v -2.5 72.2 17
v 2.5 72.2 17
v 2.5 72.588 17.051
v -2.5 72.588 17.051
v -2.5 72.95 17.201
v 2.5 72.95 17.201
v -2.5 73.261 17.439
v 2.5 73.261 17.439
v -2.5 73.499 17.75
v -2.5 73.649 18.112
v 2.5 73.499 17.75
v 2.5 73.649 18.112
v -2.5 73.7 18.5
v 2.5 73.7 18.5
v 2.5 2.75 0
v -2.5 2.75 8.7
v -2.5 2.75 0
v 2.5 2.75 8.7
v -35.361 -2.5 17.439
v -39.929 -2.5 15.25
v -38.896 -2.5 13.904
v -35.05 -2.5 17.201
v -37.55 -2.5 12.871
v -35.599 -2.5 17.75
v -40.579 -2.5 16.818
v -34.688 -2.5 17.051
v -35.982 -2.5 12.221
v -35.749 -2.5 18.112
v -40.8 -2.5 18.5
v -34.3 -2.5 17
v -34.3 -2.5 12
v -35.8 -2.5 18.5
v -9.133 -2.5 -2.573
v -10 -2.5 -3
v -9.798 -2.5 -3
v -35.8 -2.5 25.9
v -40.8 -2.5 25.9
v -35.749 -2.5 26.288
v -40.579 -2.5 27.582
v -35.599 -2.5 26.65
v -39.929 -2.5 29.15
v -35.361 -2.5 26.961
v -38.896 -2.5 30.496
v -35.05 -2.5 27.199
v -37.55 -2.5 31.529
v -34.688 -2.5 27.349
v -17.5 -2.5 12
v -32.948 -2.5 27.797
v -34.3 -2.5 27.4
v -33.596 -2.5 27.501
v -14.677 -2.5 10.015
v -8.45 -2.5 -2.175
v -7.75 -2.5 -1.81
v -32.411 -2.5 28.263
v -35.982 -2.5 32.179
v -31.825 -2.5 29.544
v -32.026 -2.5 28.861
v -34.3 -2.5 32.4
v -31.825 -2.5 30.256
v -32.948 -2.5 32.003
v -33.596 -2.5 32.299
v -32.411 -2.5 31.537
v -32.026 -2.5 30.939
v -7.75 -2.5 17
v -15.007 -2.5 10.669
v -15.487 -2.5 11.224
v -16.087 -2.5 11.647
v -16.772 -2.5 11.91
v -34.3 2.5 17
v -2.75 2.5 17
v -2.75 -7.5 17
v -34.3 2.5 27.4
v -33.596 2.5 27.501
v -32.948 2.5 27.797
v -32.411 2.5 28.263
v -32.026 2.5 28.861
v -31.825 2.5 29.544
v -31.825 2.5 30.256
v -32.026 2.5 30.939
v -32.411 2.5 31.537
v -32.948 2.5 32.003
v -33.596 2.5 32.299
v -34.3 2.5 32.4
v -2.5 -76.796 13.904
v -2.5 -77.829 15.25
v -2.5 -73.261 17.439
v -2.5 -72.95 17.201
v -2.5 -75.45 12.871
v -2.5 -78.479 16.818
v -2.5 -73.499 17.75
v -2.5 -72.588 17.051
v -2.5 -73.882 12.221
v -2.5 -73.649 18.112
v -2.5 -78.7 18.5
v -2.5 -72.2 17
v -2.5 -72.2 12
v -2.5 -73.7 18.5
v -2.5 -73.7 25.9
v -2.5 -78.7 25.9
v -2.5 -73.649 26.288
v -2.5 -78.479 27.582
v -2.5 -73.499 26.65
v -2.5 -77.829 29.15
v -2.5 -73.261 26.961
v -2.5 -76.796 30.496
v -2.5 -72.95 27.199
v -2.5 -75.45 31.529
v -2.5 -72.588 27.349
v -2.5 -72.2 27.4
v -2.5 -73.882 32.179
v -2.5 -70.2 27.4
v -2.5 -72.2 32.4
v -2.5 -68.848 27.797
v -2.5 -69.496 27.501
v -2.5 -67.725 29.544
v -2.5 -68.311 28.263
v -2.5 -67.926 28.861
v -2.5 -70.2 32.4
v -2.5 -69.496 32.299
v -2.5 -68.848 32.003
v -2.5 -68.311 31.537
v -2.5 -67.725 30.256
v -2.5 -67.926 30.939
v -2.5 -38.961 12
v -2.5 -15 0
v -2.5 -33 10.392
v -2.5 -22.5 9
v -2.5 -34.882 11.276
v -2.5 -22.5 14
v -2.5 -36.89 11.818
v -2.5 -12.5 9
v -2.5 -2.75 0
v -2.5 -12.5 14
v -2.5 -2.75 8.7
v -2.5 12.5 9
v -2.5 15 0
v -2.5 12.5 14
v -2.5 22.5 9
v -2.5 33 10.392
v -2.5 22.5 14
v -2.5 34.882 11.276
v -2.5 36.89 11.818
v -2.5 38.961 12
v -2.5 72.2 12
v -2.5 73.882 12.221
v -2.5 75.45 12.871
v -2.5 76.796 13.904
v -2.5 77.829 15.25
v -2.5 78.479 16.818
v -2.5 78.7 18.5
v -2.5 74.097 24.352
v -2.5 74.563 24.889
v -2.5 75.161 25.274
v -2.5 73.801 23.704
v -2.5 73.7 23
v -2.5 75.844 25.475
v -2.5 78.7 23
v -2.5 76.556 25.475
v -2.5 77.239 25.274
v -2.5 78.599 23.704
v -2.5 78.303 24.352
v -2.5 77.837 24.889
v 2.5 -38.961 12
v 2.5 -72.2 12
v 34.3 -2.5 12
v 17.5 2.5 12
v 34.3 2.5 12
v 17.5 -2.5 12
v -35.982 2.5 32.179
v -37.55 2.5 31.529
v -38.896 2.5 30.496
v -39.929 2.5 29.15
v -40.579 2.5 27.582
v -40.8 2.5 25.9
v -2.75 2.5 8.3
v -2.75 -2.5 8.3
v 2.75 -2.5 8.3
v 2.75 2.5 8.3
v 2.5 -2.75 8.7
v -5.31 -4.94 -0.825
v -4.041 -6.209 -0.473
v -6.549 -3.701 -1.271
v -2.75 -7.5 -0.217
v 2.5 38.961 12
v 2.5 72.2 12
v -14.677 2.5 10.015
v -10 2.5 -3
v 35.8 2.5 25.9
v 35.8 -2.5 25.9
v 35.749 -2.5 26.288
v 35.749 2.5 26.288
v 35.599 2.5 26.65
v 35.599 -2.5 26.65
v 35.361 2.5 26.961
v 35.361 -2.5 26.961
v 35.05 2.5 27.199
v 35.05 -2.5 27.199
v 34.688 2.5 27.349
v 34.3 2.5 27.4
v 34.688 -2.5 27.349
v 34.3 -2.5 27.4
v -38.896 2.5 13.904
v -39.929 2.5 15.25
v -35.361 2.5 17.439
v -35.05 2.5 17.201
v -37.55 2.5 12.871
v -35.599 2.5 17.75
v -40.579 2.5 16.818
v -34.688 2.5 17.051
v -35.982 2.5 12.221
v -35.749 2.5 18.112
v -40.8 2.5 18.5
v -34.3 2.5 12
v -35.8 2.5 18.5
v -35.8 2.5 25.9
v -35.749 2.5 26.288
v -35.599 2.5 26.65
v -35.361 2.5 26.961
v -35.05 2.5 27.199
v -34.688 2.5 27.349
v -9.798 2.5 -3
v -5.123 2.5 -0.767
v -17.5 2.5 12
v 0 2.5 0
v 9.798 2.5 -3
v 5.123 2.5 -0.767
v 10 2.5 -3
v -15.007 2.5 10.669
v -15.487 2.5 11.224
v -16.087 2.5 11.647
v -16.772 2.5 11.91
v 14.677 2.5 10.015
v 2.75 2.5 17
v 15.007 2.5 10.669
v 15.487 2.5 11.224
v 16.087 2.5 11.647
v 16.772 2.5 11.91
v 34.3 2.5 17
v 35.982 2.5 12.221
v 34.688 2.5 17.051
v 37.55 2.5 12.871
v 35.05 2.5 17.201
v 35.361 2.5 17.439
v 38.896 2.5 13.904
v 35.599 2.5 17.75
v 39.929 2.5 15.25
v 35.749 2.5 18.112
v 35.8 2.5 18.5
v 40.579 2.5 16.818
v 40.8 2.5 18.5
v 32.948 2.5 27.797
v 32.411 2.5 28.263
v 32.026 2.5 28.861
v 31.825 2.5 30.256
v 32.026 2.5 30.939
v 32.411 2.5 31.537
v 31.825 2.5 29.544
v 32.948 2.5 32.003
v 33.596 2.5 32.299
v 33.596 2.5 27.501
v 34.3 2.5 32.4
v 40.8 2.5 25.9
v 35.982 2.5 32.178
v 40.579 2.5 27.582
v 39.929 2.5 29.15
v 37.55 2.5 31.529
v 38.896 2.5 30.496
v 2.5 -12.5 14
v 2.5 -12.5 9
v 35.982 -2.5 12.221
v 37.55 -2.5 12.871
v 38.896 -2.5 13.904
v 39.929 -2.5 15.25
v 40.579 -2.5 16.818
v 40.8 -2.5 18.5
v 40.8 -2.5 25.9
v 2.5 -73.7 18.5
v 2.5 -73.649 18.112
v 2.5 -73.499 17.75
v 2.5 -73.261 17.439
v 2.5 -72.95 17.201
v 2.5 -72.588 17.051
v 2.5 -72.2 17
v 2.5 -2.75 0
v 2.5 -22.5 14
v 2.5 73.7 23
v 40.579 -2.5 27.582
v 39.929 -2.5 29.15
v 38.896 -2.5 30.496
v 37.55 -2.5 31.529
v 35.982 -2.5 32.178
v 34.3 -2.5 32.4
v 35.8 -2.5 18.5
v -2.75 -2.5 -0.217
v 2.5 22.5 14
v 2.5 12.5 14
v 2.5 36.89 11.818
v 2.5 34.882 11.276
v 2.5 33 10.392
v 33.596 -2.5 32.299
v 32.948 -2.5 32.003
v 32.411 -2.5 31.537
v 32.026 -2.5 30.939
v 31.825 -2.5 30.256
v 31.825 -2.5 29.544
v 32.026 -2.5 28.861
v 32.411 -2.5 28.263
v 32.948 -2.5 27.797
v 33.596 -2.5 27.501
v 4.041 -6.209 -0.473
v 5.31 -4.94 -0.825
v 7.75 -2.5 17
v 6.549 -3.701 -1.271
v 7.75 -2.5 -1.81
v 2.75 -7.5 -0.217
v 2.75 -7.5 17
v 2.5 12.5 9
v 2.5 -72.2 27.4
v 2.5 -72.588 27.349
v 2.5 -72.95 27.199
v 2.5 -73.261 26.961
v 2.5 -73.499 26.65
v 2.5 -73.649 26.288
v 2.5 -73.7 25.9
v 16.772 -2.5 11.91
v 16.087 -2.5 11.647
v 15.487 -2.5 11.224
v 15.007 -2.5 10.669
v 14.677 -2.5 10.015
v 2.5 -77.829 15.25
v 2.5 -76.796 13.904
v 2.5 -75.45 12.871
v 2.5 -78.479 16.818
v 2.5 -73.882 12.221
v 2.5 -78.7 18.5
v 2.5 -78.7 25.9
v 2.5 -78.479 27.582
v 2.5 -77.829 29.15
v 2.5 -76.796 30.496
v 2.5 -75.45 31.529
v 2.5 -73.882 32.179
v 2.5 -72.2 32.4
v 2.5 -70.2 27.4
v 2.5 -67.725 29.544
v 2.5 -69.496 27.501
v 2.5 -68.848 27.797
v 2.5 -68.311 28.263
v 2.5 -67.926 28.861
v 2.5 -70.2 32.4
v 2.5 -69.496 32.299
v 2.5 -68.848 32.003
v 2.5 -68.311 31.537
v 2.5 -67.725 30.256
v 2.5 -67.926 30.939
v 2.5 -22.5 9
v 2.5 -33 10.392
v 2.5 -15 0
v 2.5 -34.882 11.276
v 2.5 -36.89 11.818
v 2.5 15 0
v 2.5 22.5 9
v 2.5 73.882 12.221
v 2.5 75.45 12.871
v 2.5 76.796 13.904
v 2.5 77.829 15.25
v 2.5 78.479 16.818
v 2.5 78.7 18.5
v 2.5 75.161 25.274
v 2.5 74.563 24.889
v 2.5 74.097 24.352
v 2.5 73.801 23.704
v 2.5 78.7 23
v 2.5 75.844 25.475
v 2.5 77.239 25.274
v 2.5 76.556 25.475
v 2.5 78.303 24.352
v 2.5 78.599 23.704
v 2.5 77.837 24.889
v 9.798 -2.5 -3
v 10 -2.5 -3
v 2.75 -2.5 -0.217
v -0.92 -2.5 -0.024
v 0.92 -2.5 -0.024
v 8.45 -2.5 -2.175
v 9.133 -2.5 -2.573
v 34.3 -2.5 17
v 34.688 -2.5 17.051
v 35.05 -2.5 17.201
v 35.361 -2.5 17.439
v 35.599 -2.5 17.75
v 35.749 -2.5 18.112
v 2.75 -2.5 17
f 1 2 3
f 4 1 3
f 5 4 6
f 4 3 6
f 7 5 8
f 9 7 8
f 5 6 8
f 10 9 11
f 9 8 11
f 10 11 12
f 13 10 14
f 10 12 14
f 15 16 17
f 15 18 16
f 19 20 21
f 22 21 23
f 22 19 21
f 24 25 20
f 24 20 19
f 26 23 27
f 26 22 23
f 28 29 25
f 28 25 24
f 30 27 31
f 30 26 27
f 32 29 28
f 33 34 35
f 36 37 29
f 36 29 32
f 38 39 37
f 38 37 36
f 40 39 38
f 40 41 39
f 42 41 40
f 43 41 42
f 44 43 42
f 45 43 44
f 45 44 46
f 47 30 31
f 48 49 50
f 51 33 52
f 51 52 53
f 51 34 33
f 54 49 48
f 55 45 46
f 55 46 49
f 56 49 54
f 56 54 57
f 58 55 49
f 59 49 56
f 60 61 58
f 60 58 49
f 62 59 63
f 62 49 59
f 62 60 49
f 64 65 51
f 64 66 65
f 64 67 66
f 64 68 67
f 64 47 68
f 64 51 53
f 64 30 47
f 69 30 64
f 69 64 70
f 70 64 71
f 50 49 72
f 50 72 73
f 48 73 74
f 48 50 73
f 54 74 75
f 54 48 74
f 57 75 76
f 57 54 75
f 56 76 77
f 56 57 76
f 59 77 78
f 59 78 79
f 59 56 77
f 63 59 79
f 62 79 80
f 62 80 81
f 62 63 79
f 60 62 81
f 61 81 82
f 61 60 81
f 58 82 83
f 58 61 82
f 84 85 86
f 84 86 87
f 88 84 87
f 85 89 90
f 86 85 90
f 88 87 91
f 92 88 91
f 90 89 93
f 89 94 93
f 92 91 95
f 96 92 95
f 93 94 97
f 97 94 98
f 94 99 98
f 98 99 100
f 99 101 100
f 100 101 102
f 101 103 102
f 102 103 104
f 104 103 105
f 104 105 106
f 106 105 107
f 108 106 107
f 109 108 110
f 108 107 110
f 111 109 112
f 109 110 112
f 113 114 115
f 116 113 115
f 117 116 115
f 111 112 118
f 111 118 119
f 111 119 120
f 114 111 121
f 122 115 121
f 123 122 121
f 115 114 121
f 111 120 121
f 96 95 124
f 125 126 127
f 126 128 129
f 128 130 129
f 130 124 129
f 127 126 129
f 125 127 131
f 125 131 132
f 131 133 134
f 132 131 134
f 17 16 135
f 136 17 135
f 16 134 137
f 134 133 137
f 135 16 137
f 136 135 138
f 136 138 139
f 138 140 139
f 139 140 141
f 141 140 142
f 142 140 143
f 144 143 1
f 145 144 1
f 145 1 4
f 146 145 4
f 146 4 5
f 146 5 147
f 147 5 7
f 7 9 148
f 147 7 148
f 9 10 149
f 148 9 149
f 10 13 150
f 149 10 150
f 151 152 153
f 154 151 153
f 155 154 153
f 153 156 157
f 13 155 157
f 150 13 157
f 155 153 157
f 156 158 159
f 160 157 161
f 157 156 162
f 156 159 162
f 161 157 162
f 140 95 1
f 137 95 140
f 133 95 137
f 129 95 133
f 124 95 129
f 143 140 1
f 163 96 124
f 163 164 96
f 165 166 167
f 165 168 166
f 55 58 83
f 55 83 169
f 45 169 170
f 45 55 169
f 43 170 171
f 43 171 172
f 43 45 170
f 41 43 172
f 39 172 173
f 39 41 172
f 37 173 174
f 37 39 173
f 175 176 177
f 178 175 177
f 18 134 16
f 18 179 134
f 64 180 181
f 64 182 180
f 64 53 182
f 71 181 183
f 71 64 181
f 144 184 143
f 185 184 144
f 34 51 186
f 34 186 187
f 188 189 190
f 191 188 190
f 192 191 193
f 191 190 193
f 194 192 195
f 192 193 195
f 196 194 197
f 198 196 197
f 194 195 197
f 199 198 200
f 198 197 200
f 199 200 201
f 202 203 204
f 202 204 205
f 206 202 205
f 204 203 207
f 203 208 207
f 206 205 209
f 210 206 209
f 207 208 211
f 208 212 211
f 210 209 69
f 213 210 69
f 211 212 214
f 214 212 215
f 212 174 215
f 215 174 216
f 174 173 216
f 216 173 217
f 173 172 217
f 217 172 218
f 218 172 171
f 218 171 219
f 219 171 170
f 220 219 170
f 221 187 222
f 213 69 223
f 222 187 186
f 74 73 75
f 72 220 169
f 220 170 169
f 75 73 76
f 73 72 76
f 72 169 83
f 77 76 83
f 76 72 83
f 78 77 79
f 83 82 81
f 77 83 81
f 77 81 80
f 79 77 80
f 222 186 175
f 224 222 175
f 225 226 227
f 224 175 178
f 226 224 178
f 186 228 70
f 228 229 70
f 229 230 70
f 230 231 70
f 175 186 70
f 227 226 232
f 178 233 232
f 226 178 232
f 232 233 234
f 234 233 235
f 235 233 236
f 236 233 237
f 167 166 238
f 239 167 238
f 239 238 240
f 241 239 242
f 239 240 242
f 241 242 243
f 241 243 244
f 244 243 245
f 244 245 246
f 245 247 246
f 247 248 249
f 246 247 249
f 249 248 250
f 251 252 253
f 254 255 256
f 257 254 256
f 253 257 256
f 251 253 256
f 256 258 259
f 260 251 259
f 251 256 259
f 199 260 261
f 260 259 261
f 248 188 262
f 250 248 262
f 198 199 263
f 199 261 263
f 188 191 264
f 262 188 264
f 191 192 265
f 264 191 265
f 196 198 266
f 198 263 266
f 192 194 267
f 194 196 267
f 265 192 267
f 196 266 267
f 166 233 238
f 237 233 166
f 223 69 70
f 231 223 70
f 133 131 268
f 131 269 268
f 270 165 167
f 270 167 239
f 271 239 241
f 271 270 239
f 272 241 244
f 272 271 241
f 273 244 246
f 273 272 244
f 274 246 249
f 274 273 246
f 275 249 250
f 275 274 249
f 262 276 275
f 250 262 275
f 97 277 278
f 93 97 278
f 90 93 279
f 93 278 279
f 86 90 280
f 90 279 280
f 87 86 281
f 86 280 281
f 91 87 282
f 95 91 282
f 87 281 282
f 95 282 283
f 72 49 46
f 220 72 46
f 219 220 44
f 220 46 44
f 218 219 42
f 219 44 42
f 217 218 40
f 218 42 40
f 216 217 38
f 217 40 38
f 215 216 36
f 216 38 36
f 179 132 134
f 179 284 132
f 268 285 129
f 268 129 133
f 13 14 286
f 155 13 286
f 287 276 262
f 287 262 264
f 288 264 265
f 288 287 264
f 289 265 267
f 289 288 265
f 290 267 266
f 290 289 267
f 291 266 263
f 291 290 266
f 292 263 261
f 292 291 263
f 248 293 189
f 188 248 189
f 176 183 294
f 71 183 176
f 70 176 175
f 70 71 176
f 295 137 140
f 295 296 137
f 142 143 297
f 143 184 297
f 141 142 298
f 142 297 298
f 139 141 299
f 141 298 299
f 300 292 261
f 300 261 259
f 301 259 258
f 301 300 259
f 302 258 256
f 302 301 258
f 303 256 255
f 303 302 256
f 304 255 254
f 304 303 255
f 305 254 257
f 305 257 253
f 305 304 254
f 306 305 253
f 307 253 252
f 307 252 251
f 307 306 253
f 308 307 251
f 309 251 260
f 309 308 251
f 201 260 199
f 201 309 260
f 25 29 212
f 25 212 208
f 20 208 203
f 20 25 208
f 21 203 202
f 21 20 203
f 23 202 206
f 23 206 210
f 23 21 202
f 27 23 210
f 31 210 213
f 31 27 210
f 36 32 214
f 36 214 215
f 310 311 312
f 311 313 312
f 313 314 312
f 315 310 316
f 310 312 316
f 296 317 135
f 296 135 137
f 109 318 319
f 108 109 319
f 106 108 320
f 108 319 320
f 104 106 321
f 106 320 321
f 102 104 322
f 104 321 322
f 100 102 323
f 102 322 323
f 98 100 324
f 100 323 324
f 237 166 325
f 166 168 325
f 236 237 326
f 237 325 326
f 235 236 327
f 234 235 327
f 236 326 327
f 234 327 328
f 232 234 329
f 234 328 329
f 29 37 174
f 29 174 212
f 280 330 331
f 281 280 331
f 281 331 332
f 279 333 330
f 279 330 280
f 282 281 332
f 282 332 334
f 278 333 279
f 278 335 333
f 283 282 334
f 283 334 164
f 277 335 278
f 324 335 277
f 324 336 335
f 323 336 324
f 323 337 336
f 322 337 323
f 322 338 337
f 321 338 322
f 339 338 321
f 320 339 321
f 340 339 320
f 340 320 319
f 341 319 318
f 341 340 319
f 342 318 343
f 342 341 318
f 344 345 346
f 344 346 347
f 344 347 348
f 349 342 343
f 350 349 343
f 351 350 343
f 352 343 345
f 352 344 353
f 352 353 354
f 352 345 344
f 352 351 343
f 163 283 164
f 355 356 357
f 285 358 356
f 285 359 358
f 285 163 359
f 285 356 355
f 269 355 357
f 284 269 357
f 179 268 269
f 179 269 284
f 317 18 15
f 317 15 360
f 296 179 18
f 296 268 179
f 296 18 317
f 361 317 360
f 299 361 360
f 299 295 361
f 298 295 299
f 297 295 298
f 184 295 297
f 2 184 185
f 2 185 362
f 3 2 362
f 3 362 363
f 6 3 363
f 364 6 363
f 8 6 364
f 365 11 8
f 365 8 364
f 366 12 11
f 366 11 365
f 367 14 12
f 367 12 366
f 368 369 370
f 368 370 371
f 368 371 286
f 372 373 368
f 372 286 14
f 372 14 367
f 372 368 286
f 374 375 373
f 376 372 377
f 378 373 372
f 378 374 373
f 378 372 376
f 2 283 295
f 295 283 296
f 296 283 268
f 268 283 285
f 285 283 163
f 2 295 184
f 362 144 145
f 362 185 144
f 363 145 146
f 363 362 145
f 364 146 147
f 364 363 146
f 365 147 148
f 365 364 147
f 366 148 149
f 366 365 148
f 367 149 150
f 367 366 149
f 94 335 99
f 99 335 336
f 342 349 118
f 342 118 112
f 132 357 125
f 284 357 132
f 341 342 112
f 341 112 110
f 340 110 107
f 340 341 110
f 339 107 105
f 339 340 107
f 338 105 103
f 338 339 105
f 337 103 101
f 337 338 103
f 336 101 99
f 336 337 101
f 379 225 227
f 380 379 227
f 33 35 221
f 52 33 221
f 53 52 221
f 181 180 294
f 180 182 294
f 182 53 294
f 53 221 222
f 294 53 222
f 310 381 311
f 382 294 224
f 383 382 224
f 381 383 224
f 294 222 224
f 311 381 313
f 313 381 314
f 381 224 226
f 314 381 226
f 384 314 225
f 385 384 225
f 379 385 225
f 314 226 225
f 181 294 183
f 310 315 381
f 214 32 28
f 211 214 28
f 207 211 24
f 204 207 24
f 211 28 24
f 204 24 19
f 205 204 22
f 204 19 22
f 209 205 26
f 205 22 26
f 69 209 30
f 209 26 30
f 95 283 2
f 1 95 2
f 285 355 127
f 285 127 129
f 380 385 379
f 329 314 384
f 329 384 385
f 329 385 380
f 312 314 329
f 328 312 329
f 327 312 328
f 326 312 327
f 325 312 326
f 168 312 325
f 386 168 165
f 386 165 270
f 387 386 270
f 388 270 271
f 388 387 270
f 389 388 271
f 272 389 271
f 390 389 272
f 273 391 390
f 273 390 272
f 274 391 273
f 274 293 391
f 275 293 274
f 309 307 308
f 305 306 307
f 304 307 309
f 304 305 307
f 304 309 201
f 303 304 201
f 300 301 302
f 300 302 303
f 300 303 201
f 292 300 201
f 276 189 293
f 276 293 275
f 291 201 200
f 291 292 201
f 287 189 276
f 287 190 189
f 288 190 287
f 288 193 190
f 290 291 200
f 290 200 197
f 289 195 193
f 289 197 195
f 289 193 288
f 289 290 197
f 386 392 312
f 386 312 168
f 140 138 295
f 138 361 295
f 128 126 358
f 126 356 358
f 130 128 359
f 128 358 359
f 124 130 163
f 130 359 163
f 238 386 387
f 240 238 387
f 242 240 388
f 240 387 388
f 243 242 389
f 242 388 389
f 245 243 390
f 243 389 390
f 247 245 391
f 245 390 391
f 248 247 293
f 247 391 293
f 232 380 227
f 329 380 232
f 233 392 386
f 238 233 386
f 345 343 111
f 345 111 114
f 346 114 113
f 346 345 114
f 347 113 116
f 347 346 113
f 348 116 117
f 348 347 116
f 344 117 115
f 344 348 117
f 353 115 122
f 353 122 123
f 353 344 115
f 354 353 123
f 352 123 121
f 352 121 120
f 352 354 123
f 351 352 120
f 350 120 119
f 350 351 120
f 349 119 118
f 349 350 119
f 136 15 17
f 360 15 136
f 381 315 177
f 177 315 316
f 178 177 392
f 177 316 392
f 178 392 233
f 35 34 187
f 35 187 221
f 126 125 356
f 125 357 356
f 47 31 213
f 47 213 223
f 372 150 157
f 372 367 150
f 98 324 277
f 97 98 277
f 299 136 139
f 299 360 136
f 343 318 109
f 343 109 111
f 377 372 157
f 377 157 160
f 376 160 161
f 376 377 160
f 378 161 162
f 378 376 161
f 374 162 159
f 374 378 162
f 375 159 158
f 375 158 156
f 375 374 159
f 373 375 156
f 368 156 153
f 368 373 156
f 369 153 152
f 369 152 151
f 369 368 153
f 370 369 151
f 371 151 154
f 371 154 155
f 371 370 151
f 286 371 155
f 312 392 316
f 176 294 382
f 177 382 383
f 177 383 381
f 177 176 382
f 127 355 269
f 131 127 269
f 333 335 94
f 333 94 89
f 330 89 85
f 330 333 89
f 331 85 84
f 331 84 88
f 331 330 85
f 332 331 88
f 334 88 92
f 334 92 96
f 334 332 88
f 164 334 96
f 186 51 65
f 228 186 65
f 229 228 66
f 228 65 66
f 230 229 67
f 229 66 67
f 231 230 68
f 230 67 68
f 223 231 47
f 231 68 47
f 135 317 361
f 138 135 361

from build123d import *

# Parameters (mm, degrees)
SKETCH_W     = 10
SKETCH_H     = 5
PAD_DEPTH    = 2.5
PAD001_DEPTH = 2.5
PAD002_DEPTH = 20
POCKET_DEPTH = 10


with BuildPart() as vertical:
    # Sketch → Pad (new body, symmetric)
    with BuildSketch(Plane.YZ):
        with BuildLine():
            Line((78.7, 18.500001), (78.7, 23.000006))
            ThreePointArc((78.7, 23.000006), (76.199997, 25.500005), (73.7, 23))
            Line((73.7, 18.500007), (73.7, 23))
            ThreePointArc((72.200003, 17), (73.260664, 17.439343), (73.7, 18.500007))
            Line((-72.200002, 17), (72.200003, 17))
            ThreePointArc((-73.7, 18.500007), (-73.260663, 17.439343), (-72.200002, 17))
            Line((-73.7, 25.899992), (-73.7, 18.500007))
            ThreePointArc((-72.200002, 27.4), (-73.260664, 26.960657), (-73.7, 25.899992))
            Line((-72.200002, 27.4), (-70.200002, 27.4))
            ThreePointArc((-70.200002, 27.4), (-67.700002, 29.9), (-70.200002, 32.4))
            Line((-70.200002, 32.4), (-72.200001, 32.4))
            ThreePointArc((-72.200001, 32.4), (-76.796194, 30.496194), (-78.7, 25.9))
            Line((-78.7, 18.500007), (-78.7, 25.9))
            ThreePointArc((-78.7, 18.500007), (-76.796197, 13.903808), (-72.2, 12))
            Line((-72.2, 12), (-38.960751, 12))
            ThreePointArc((-33, 10.392302), (-35.873874, 11.59102), (-38.960751, 12))
            Line((-15, 0), (-33, 10.392302))
            Line((-15, 0), (-2.75, 0))
            Line((-2.75, 0), (-2.75, 8.7))
            Line((-2.75, 8.7), (2.75, 8.7))
            Line((2.75, 8.7), (2.75, 0))
            Line((2.75, 0), (15, 0))
            Line((15, 0), (33, 10.392302))
            ThreePointArc((38.960751, 12), (35.873874, 11.59102), (33, 10.392302))
            Line((38.960751, 12), (72.2, 12))
            ThreePointArc((72.2, 12), (76.796194, 13.903806), (78.7, 18.500001))
        make_face()
        with Locations((-17.5, 11.5)):
            Rectangle(SKETCH_W, SKETCH_H, mode=Mode.SUBTRACT)
        with Locations((17.5, 11.5)):
            Rectangle(SKETCH_W, SKETCH_H, mode=Mode.SUBTRACT)
    extrude(amount=PAD_DEPTH, both=True)


with BuildPart() as fusion:
    # Sketch001 → Pad001 (new body, symmetric)
    with BuildSketch(Plane.XZ):
        with BuildLine():
            Line((17.5, 11.999985), (34.300008, 12))
            ThreePointArc((34.300008, 12), (38.896196, 13.903808), (40.8, 18.499998))
            Line((40.8, 25.899974), (40.8, 18.499998))
            ThreePointArc((40.8, 25.899974), (38.896194, 30.496166), (34.300002, 32.399972))
            ThreePointArc((34.300002, 32.399972), (31.800002, 29.899972), (34.300002, 27.399972))
            ThreePointArc((35.8, 25.899974), (35.36066, 26.960632), (34.300002, 27.399972))
            Line((35.8, 18.499998), (35.8, 25.899974))
            ThreePointArc((34.300002, 17), (35.36066, 17.43934), (35.8, 18.499998))
            Line((2.75, 17), (34.300002, 17))
            Line((2.75, 8.3), (2.75, 17))
            Line((-2.75, 8.3), (2.75, 8.3))
            Line((-2.75, 16.999985), (-2.75, 8.3))
            Line((-34.3, 16.999985), (-2.75, 16.999985))
            ThreePointArc((-35.8, 18.499998), (-35.360665, 17.439329), (-34.3, 16.999985))
            Line((-35.8, 18.499998), (-35.8, 25.899974))
            ThreePointArc((-34.300002, 27.399985), (-35.360665, 26.960641), (-35.8, 25.899974))
            ThreePointArc((-34.300002, 27.399985), (-31.800002, 29.899985), (-34.300002, 32.399985))
            ThreePointArc((-34.300002, 32.399985), (-38.896199, 30.496175), (-40.8, 25.899974))
            Line((-40.8, 25.899974), (-40.8, 18.499998))
            ThreePointArc((-40.8, 18.499998), (-38.896199, 13.903797), (-34.300002, 11.999985))
            Line((-34.300002, 11.999985), (-17.5, 11.999985))
            ThreePointArc((-14.676752, 10.014516), (-15.774253, 11.45392), (-17.5, 11.999985))
            Line((-14.676752, 10.014516), (-10, -3))
            Line((-10, -3), (10, -3))
            Line((10, -3), (14.676758, 10.014525))
            ThreePointArc((17.5, 11.999985), (15.774258, 11.453922), (14.676758, 10.014525))
        make_face()
    extrude(amount=PAD001_DEPTH, both=True)

    # Sketch002 → Pad002 (new body)
    with BuildSketch(Plane(origin=(0, 0, 16.999985), x_dir=(-1, 0, 0), z_dir=(0, 0, 1))):
        Polygon((-7.75, 2.5), (-2.75, 7.5), (-2.75, 2.5), align=None)
        Polygon((2.75, 7.5), (2.75, 2.5), (7.75, 2.5), align=None)
    extrude(amount=-PAD002_DEPTH)

    # Sketch003 → Pocket (cut)
    with BuildSketch(Plane(origin=(0, 2.5, 0), x_dir=(1, 0, 0), z_dir=(0, 1, 0))):
        with BuildLine():
            ThreePointArc((-10, 3.138593), (0, 0), (10, 3.138593))
            Line((-10, 3.138593), (10, 3.138593))
        make_face()
    extrude(amount=-POCKET_DEPTH, mode=Mode.SUBTRACT)

    # Fusion: union Vertical
    add(vertical.part)


solid = fusion.part
